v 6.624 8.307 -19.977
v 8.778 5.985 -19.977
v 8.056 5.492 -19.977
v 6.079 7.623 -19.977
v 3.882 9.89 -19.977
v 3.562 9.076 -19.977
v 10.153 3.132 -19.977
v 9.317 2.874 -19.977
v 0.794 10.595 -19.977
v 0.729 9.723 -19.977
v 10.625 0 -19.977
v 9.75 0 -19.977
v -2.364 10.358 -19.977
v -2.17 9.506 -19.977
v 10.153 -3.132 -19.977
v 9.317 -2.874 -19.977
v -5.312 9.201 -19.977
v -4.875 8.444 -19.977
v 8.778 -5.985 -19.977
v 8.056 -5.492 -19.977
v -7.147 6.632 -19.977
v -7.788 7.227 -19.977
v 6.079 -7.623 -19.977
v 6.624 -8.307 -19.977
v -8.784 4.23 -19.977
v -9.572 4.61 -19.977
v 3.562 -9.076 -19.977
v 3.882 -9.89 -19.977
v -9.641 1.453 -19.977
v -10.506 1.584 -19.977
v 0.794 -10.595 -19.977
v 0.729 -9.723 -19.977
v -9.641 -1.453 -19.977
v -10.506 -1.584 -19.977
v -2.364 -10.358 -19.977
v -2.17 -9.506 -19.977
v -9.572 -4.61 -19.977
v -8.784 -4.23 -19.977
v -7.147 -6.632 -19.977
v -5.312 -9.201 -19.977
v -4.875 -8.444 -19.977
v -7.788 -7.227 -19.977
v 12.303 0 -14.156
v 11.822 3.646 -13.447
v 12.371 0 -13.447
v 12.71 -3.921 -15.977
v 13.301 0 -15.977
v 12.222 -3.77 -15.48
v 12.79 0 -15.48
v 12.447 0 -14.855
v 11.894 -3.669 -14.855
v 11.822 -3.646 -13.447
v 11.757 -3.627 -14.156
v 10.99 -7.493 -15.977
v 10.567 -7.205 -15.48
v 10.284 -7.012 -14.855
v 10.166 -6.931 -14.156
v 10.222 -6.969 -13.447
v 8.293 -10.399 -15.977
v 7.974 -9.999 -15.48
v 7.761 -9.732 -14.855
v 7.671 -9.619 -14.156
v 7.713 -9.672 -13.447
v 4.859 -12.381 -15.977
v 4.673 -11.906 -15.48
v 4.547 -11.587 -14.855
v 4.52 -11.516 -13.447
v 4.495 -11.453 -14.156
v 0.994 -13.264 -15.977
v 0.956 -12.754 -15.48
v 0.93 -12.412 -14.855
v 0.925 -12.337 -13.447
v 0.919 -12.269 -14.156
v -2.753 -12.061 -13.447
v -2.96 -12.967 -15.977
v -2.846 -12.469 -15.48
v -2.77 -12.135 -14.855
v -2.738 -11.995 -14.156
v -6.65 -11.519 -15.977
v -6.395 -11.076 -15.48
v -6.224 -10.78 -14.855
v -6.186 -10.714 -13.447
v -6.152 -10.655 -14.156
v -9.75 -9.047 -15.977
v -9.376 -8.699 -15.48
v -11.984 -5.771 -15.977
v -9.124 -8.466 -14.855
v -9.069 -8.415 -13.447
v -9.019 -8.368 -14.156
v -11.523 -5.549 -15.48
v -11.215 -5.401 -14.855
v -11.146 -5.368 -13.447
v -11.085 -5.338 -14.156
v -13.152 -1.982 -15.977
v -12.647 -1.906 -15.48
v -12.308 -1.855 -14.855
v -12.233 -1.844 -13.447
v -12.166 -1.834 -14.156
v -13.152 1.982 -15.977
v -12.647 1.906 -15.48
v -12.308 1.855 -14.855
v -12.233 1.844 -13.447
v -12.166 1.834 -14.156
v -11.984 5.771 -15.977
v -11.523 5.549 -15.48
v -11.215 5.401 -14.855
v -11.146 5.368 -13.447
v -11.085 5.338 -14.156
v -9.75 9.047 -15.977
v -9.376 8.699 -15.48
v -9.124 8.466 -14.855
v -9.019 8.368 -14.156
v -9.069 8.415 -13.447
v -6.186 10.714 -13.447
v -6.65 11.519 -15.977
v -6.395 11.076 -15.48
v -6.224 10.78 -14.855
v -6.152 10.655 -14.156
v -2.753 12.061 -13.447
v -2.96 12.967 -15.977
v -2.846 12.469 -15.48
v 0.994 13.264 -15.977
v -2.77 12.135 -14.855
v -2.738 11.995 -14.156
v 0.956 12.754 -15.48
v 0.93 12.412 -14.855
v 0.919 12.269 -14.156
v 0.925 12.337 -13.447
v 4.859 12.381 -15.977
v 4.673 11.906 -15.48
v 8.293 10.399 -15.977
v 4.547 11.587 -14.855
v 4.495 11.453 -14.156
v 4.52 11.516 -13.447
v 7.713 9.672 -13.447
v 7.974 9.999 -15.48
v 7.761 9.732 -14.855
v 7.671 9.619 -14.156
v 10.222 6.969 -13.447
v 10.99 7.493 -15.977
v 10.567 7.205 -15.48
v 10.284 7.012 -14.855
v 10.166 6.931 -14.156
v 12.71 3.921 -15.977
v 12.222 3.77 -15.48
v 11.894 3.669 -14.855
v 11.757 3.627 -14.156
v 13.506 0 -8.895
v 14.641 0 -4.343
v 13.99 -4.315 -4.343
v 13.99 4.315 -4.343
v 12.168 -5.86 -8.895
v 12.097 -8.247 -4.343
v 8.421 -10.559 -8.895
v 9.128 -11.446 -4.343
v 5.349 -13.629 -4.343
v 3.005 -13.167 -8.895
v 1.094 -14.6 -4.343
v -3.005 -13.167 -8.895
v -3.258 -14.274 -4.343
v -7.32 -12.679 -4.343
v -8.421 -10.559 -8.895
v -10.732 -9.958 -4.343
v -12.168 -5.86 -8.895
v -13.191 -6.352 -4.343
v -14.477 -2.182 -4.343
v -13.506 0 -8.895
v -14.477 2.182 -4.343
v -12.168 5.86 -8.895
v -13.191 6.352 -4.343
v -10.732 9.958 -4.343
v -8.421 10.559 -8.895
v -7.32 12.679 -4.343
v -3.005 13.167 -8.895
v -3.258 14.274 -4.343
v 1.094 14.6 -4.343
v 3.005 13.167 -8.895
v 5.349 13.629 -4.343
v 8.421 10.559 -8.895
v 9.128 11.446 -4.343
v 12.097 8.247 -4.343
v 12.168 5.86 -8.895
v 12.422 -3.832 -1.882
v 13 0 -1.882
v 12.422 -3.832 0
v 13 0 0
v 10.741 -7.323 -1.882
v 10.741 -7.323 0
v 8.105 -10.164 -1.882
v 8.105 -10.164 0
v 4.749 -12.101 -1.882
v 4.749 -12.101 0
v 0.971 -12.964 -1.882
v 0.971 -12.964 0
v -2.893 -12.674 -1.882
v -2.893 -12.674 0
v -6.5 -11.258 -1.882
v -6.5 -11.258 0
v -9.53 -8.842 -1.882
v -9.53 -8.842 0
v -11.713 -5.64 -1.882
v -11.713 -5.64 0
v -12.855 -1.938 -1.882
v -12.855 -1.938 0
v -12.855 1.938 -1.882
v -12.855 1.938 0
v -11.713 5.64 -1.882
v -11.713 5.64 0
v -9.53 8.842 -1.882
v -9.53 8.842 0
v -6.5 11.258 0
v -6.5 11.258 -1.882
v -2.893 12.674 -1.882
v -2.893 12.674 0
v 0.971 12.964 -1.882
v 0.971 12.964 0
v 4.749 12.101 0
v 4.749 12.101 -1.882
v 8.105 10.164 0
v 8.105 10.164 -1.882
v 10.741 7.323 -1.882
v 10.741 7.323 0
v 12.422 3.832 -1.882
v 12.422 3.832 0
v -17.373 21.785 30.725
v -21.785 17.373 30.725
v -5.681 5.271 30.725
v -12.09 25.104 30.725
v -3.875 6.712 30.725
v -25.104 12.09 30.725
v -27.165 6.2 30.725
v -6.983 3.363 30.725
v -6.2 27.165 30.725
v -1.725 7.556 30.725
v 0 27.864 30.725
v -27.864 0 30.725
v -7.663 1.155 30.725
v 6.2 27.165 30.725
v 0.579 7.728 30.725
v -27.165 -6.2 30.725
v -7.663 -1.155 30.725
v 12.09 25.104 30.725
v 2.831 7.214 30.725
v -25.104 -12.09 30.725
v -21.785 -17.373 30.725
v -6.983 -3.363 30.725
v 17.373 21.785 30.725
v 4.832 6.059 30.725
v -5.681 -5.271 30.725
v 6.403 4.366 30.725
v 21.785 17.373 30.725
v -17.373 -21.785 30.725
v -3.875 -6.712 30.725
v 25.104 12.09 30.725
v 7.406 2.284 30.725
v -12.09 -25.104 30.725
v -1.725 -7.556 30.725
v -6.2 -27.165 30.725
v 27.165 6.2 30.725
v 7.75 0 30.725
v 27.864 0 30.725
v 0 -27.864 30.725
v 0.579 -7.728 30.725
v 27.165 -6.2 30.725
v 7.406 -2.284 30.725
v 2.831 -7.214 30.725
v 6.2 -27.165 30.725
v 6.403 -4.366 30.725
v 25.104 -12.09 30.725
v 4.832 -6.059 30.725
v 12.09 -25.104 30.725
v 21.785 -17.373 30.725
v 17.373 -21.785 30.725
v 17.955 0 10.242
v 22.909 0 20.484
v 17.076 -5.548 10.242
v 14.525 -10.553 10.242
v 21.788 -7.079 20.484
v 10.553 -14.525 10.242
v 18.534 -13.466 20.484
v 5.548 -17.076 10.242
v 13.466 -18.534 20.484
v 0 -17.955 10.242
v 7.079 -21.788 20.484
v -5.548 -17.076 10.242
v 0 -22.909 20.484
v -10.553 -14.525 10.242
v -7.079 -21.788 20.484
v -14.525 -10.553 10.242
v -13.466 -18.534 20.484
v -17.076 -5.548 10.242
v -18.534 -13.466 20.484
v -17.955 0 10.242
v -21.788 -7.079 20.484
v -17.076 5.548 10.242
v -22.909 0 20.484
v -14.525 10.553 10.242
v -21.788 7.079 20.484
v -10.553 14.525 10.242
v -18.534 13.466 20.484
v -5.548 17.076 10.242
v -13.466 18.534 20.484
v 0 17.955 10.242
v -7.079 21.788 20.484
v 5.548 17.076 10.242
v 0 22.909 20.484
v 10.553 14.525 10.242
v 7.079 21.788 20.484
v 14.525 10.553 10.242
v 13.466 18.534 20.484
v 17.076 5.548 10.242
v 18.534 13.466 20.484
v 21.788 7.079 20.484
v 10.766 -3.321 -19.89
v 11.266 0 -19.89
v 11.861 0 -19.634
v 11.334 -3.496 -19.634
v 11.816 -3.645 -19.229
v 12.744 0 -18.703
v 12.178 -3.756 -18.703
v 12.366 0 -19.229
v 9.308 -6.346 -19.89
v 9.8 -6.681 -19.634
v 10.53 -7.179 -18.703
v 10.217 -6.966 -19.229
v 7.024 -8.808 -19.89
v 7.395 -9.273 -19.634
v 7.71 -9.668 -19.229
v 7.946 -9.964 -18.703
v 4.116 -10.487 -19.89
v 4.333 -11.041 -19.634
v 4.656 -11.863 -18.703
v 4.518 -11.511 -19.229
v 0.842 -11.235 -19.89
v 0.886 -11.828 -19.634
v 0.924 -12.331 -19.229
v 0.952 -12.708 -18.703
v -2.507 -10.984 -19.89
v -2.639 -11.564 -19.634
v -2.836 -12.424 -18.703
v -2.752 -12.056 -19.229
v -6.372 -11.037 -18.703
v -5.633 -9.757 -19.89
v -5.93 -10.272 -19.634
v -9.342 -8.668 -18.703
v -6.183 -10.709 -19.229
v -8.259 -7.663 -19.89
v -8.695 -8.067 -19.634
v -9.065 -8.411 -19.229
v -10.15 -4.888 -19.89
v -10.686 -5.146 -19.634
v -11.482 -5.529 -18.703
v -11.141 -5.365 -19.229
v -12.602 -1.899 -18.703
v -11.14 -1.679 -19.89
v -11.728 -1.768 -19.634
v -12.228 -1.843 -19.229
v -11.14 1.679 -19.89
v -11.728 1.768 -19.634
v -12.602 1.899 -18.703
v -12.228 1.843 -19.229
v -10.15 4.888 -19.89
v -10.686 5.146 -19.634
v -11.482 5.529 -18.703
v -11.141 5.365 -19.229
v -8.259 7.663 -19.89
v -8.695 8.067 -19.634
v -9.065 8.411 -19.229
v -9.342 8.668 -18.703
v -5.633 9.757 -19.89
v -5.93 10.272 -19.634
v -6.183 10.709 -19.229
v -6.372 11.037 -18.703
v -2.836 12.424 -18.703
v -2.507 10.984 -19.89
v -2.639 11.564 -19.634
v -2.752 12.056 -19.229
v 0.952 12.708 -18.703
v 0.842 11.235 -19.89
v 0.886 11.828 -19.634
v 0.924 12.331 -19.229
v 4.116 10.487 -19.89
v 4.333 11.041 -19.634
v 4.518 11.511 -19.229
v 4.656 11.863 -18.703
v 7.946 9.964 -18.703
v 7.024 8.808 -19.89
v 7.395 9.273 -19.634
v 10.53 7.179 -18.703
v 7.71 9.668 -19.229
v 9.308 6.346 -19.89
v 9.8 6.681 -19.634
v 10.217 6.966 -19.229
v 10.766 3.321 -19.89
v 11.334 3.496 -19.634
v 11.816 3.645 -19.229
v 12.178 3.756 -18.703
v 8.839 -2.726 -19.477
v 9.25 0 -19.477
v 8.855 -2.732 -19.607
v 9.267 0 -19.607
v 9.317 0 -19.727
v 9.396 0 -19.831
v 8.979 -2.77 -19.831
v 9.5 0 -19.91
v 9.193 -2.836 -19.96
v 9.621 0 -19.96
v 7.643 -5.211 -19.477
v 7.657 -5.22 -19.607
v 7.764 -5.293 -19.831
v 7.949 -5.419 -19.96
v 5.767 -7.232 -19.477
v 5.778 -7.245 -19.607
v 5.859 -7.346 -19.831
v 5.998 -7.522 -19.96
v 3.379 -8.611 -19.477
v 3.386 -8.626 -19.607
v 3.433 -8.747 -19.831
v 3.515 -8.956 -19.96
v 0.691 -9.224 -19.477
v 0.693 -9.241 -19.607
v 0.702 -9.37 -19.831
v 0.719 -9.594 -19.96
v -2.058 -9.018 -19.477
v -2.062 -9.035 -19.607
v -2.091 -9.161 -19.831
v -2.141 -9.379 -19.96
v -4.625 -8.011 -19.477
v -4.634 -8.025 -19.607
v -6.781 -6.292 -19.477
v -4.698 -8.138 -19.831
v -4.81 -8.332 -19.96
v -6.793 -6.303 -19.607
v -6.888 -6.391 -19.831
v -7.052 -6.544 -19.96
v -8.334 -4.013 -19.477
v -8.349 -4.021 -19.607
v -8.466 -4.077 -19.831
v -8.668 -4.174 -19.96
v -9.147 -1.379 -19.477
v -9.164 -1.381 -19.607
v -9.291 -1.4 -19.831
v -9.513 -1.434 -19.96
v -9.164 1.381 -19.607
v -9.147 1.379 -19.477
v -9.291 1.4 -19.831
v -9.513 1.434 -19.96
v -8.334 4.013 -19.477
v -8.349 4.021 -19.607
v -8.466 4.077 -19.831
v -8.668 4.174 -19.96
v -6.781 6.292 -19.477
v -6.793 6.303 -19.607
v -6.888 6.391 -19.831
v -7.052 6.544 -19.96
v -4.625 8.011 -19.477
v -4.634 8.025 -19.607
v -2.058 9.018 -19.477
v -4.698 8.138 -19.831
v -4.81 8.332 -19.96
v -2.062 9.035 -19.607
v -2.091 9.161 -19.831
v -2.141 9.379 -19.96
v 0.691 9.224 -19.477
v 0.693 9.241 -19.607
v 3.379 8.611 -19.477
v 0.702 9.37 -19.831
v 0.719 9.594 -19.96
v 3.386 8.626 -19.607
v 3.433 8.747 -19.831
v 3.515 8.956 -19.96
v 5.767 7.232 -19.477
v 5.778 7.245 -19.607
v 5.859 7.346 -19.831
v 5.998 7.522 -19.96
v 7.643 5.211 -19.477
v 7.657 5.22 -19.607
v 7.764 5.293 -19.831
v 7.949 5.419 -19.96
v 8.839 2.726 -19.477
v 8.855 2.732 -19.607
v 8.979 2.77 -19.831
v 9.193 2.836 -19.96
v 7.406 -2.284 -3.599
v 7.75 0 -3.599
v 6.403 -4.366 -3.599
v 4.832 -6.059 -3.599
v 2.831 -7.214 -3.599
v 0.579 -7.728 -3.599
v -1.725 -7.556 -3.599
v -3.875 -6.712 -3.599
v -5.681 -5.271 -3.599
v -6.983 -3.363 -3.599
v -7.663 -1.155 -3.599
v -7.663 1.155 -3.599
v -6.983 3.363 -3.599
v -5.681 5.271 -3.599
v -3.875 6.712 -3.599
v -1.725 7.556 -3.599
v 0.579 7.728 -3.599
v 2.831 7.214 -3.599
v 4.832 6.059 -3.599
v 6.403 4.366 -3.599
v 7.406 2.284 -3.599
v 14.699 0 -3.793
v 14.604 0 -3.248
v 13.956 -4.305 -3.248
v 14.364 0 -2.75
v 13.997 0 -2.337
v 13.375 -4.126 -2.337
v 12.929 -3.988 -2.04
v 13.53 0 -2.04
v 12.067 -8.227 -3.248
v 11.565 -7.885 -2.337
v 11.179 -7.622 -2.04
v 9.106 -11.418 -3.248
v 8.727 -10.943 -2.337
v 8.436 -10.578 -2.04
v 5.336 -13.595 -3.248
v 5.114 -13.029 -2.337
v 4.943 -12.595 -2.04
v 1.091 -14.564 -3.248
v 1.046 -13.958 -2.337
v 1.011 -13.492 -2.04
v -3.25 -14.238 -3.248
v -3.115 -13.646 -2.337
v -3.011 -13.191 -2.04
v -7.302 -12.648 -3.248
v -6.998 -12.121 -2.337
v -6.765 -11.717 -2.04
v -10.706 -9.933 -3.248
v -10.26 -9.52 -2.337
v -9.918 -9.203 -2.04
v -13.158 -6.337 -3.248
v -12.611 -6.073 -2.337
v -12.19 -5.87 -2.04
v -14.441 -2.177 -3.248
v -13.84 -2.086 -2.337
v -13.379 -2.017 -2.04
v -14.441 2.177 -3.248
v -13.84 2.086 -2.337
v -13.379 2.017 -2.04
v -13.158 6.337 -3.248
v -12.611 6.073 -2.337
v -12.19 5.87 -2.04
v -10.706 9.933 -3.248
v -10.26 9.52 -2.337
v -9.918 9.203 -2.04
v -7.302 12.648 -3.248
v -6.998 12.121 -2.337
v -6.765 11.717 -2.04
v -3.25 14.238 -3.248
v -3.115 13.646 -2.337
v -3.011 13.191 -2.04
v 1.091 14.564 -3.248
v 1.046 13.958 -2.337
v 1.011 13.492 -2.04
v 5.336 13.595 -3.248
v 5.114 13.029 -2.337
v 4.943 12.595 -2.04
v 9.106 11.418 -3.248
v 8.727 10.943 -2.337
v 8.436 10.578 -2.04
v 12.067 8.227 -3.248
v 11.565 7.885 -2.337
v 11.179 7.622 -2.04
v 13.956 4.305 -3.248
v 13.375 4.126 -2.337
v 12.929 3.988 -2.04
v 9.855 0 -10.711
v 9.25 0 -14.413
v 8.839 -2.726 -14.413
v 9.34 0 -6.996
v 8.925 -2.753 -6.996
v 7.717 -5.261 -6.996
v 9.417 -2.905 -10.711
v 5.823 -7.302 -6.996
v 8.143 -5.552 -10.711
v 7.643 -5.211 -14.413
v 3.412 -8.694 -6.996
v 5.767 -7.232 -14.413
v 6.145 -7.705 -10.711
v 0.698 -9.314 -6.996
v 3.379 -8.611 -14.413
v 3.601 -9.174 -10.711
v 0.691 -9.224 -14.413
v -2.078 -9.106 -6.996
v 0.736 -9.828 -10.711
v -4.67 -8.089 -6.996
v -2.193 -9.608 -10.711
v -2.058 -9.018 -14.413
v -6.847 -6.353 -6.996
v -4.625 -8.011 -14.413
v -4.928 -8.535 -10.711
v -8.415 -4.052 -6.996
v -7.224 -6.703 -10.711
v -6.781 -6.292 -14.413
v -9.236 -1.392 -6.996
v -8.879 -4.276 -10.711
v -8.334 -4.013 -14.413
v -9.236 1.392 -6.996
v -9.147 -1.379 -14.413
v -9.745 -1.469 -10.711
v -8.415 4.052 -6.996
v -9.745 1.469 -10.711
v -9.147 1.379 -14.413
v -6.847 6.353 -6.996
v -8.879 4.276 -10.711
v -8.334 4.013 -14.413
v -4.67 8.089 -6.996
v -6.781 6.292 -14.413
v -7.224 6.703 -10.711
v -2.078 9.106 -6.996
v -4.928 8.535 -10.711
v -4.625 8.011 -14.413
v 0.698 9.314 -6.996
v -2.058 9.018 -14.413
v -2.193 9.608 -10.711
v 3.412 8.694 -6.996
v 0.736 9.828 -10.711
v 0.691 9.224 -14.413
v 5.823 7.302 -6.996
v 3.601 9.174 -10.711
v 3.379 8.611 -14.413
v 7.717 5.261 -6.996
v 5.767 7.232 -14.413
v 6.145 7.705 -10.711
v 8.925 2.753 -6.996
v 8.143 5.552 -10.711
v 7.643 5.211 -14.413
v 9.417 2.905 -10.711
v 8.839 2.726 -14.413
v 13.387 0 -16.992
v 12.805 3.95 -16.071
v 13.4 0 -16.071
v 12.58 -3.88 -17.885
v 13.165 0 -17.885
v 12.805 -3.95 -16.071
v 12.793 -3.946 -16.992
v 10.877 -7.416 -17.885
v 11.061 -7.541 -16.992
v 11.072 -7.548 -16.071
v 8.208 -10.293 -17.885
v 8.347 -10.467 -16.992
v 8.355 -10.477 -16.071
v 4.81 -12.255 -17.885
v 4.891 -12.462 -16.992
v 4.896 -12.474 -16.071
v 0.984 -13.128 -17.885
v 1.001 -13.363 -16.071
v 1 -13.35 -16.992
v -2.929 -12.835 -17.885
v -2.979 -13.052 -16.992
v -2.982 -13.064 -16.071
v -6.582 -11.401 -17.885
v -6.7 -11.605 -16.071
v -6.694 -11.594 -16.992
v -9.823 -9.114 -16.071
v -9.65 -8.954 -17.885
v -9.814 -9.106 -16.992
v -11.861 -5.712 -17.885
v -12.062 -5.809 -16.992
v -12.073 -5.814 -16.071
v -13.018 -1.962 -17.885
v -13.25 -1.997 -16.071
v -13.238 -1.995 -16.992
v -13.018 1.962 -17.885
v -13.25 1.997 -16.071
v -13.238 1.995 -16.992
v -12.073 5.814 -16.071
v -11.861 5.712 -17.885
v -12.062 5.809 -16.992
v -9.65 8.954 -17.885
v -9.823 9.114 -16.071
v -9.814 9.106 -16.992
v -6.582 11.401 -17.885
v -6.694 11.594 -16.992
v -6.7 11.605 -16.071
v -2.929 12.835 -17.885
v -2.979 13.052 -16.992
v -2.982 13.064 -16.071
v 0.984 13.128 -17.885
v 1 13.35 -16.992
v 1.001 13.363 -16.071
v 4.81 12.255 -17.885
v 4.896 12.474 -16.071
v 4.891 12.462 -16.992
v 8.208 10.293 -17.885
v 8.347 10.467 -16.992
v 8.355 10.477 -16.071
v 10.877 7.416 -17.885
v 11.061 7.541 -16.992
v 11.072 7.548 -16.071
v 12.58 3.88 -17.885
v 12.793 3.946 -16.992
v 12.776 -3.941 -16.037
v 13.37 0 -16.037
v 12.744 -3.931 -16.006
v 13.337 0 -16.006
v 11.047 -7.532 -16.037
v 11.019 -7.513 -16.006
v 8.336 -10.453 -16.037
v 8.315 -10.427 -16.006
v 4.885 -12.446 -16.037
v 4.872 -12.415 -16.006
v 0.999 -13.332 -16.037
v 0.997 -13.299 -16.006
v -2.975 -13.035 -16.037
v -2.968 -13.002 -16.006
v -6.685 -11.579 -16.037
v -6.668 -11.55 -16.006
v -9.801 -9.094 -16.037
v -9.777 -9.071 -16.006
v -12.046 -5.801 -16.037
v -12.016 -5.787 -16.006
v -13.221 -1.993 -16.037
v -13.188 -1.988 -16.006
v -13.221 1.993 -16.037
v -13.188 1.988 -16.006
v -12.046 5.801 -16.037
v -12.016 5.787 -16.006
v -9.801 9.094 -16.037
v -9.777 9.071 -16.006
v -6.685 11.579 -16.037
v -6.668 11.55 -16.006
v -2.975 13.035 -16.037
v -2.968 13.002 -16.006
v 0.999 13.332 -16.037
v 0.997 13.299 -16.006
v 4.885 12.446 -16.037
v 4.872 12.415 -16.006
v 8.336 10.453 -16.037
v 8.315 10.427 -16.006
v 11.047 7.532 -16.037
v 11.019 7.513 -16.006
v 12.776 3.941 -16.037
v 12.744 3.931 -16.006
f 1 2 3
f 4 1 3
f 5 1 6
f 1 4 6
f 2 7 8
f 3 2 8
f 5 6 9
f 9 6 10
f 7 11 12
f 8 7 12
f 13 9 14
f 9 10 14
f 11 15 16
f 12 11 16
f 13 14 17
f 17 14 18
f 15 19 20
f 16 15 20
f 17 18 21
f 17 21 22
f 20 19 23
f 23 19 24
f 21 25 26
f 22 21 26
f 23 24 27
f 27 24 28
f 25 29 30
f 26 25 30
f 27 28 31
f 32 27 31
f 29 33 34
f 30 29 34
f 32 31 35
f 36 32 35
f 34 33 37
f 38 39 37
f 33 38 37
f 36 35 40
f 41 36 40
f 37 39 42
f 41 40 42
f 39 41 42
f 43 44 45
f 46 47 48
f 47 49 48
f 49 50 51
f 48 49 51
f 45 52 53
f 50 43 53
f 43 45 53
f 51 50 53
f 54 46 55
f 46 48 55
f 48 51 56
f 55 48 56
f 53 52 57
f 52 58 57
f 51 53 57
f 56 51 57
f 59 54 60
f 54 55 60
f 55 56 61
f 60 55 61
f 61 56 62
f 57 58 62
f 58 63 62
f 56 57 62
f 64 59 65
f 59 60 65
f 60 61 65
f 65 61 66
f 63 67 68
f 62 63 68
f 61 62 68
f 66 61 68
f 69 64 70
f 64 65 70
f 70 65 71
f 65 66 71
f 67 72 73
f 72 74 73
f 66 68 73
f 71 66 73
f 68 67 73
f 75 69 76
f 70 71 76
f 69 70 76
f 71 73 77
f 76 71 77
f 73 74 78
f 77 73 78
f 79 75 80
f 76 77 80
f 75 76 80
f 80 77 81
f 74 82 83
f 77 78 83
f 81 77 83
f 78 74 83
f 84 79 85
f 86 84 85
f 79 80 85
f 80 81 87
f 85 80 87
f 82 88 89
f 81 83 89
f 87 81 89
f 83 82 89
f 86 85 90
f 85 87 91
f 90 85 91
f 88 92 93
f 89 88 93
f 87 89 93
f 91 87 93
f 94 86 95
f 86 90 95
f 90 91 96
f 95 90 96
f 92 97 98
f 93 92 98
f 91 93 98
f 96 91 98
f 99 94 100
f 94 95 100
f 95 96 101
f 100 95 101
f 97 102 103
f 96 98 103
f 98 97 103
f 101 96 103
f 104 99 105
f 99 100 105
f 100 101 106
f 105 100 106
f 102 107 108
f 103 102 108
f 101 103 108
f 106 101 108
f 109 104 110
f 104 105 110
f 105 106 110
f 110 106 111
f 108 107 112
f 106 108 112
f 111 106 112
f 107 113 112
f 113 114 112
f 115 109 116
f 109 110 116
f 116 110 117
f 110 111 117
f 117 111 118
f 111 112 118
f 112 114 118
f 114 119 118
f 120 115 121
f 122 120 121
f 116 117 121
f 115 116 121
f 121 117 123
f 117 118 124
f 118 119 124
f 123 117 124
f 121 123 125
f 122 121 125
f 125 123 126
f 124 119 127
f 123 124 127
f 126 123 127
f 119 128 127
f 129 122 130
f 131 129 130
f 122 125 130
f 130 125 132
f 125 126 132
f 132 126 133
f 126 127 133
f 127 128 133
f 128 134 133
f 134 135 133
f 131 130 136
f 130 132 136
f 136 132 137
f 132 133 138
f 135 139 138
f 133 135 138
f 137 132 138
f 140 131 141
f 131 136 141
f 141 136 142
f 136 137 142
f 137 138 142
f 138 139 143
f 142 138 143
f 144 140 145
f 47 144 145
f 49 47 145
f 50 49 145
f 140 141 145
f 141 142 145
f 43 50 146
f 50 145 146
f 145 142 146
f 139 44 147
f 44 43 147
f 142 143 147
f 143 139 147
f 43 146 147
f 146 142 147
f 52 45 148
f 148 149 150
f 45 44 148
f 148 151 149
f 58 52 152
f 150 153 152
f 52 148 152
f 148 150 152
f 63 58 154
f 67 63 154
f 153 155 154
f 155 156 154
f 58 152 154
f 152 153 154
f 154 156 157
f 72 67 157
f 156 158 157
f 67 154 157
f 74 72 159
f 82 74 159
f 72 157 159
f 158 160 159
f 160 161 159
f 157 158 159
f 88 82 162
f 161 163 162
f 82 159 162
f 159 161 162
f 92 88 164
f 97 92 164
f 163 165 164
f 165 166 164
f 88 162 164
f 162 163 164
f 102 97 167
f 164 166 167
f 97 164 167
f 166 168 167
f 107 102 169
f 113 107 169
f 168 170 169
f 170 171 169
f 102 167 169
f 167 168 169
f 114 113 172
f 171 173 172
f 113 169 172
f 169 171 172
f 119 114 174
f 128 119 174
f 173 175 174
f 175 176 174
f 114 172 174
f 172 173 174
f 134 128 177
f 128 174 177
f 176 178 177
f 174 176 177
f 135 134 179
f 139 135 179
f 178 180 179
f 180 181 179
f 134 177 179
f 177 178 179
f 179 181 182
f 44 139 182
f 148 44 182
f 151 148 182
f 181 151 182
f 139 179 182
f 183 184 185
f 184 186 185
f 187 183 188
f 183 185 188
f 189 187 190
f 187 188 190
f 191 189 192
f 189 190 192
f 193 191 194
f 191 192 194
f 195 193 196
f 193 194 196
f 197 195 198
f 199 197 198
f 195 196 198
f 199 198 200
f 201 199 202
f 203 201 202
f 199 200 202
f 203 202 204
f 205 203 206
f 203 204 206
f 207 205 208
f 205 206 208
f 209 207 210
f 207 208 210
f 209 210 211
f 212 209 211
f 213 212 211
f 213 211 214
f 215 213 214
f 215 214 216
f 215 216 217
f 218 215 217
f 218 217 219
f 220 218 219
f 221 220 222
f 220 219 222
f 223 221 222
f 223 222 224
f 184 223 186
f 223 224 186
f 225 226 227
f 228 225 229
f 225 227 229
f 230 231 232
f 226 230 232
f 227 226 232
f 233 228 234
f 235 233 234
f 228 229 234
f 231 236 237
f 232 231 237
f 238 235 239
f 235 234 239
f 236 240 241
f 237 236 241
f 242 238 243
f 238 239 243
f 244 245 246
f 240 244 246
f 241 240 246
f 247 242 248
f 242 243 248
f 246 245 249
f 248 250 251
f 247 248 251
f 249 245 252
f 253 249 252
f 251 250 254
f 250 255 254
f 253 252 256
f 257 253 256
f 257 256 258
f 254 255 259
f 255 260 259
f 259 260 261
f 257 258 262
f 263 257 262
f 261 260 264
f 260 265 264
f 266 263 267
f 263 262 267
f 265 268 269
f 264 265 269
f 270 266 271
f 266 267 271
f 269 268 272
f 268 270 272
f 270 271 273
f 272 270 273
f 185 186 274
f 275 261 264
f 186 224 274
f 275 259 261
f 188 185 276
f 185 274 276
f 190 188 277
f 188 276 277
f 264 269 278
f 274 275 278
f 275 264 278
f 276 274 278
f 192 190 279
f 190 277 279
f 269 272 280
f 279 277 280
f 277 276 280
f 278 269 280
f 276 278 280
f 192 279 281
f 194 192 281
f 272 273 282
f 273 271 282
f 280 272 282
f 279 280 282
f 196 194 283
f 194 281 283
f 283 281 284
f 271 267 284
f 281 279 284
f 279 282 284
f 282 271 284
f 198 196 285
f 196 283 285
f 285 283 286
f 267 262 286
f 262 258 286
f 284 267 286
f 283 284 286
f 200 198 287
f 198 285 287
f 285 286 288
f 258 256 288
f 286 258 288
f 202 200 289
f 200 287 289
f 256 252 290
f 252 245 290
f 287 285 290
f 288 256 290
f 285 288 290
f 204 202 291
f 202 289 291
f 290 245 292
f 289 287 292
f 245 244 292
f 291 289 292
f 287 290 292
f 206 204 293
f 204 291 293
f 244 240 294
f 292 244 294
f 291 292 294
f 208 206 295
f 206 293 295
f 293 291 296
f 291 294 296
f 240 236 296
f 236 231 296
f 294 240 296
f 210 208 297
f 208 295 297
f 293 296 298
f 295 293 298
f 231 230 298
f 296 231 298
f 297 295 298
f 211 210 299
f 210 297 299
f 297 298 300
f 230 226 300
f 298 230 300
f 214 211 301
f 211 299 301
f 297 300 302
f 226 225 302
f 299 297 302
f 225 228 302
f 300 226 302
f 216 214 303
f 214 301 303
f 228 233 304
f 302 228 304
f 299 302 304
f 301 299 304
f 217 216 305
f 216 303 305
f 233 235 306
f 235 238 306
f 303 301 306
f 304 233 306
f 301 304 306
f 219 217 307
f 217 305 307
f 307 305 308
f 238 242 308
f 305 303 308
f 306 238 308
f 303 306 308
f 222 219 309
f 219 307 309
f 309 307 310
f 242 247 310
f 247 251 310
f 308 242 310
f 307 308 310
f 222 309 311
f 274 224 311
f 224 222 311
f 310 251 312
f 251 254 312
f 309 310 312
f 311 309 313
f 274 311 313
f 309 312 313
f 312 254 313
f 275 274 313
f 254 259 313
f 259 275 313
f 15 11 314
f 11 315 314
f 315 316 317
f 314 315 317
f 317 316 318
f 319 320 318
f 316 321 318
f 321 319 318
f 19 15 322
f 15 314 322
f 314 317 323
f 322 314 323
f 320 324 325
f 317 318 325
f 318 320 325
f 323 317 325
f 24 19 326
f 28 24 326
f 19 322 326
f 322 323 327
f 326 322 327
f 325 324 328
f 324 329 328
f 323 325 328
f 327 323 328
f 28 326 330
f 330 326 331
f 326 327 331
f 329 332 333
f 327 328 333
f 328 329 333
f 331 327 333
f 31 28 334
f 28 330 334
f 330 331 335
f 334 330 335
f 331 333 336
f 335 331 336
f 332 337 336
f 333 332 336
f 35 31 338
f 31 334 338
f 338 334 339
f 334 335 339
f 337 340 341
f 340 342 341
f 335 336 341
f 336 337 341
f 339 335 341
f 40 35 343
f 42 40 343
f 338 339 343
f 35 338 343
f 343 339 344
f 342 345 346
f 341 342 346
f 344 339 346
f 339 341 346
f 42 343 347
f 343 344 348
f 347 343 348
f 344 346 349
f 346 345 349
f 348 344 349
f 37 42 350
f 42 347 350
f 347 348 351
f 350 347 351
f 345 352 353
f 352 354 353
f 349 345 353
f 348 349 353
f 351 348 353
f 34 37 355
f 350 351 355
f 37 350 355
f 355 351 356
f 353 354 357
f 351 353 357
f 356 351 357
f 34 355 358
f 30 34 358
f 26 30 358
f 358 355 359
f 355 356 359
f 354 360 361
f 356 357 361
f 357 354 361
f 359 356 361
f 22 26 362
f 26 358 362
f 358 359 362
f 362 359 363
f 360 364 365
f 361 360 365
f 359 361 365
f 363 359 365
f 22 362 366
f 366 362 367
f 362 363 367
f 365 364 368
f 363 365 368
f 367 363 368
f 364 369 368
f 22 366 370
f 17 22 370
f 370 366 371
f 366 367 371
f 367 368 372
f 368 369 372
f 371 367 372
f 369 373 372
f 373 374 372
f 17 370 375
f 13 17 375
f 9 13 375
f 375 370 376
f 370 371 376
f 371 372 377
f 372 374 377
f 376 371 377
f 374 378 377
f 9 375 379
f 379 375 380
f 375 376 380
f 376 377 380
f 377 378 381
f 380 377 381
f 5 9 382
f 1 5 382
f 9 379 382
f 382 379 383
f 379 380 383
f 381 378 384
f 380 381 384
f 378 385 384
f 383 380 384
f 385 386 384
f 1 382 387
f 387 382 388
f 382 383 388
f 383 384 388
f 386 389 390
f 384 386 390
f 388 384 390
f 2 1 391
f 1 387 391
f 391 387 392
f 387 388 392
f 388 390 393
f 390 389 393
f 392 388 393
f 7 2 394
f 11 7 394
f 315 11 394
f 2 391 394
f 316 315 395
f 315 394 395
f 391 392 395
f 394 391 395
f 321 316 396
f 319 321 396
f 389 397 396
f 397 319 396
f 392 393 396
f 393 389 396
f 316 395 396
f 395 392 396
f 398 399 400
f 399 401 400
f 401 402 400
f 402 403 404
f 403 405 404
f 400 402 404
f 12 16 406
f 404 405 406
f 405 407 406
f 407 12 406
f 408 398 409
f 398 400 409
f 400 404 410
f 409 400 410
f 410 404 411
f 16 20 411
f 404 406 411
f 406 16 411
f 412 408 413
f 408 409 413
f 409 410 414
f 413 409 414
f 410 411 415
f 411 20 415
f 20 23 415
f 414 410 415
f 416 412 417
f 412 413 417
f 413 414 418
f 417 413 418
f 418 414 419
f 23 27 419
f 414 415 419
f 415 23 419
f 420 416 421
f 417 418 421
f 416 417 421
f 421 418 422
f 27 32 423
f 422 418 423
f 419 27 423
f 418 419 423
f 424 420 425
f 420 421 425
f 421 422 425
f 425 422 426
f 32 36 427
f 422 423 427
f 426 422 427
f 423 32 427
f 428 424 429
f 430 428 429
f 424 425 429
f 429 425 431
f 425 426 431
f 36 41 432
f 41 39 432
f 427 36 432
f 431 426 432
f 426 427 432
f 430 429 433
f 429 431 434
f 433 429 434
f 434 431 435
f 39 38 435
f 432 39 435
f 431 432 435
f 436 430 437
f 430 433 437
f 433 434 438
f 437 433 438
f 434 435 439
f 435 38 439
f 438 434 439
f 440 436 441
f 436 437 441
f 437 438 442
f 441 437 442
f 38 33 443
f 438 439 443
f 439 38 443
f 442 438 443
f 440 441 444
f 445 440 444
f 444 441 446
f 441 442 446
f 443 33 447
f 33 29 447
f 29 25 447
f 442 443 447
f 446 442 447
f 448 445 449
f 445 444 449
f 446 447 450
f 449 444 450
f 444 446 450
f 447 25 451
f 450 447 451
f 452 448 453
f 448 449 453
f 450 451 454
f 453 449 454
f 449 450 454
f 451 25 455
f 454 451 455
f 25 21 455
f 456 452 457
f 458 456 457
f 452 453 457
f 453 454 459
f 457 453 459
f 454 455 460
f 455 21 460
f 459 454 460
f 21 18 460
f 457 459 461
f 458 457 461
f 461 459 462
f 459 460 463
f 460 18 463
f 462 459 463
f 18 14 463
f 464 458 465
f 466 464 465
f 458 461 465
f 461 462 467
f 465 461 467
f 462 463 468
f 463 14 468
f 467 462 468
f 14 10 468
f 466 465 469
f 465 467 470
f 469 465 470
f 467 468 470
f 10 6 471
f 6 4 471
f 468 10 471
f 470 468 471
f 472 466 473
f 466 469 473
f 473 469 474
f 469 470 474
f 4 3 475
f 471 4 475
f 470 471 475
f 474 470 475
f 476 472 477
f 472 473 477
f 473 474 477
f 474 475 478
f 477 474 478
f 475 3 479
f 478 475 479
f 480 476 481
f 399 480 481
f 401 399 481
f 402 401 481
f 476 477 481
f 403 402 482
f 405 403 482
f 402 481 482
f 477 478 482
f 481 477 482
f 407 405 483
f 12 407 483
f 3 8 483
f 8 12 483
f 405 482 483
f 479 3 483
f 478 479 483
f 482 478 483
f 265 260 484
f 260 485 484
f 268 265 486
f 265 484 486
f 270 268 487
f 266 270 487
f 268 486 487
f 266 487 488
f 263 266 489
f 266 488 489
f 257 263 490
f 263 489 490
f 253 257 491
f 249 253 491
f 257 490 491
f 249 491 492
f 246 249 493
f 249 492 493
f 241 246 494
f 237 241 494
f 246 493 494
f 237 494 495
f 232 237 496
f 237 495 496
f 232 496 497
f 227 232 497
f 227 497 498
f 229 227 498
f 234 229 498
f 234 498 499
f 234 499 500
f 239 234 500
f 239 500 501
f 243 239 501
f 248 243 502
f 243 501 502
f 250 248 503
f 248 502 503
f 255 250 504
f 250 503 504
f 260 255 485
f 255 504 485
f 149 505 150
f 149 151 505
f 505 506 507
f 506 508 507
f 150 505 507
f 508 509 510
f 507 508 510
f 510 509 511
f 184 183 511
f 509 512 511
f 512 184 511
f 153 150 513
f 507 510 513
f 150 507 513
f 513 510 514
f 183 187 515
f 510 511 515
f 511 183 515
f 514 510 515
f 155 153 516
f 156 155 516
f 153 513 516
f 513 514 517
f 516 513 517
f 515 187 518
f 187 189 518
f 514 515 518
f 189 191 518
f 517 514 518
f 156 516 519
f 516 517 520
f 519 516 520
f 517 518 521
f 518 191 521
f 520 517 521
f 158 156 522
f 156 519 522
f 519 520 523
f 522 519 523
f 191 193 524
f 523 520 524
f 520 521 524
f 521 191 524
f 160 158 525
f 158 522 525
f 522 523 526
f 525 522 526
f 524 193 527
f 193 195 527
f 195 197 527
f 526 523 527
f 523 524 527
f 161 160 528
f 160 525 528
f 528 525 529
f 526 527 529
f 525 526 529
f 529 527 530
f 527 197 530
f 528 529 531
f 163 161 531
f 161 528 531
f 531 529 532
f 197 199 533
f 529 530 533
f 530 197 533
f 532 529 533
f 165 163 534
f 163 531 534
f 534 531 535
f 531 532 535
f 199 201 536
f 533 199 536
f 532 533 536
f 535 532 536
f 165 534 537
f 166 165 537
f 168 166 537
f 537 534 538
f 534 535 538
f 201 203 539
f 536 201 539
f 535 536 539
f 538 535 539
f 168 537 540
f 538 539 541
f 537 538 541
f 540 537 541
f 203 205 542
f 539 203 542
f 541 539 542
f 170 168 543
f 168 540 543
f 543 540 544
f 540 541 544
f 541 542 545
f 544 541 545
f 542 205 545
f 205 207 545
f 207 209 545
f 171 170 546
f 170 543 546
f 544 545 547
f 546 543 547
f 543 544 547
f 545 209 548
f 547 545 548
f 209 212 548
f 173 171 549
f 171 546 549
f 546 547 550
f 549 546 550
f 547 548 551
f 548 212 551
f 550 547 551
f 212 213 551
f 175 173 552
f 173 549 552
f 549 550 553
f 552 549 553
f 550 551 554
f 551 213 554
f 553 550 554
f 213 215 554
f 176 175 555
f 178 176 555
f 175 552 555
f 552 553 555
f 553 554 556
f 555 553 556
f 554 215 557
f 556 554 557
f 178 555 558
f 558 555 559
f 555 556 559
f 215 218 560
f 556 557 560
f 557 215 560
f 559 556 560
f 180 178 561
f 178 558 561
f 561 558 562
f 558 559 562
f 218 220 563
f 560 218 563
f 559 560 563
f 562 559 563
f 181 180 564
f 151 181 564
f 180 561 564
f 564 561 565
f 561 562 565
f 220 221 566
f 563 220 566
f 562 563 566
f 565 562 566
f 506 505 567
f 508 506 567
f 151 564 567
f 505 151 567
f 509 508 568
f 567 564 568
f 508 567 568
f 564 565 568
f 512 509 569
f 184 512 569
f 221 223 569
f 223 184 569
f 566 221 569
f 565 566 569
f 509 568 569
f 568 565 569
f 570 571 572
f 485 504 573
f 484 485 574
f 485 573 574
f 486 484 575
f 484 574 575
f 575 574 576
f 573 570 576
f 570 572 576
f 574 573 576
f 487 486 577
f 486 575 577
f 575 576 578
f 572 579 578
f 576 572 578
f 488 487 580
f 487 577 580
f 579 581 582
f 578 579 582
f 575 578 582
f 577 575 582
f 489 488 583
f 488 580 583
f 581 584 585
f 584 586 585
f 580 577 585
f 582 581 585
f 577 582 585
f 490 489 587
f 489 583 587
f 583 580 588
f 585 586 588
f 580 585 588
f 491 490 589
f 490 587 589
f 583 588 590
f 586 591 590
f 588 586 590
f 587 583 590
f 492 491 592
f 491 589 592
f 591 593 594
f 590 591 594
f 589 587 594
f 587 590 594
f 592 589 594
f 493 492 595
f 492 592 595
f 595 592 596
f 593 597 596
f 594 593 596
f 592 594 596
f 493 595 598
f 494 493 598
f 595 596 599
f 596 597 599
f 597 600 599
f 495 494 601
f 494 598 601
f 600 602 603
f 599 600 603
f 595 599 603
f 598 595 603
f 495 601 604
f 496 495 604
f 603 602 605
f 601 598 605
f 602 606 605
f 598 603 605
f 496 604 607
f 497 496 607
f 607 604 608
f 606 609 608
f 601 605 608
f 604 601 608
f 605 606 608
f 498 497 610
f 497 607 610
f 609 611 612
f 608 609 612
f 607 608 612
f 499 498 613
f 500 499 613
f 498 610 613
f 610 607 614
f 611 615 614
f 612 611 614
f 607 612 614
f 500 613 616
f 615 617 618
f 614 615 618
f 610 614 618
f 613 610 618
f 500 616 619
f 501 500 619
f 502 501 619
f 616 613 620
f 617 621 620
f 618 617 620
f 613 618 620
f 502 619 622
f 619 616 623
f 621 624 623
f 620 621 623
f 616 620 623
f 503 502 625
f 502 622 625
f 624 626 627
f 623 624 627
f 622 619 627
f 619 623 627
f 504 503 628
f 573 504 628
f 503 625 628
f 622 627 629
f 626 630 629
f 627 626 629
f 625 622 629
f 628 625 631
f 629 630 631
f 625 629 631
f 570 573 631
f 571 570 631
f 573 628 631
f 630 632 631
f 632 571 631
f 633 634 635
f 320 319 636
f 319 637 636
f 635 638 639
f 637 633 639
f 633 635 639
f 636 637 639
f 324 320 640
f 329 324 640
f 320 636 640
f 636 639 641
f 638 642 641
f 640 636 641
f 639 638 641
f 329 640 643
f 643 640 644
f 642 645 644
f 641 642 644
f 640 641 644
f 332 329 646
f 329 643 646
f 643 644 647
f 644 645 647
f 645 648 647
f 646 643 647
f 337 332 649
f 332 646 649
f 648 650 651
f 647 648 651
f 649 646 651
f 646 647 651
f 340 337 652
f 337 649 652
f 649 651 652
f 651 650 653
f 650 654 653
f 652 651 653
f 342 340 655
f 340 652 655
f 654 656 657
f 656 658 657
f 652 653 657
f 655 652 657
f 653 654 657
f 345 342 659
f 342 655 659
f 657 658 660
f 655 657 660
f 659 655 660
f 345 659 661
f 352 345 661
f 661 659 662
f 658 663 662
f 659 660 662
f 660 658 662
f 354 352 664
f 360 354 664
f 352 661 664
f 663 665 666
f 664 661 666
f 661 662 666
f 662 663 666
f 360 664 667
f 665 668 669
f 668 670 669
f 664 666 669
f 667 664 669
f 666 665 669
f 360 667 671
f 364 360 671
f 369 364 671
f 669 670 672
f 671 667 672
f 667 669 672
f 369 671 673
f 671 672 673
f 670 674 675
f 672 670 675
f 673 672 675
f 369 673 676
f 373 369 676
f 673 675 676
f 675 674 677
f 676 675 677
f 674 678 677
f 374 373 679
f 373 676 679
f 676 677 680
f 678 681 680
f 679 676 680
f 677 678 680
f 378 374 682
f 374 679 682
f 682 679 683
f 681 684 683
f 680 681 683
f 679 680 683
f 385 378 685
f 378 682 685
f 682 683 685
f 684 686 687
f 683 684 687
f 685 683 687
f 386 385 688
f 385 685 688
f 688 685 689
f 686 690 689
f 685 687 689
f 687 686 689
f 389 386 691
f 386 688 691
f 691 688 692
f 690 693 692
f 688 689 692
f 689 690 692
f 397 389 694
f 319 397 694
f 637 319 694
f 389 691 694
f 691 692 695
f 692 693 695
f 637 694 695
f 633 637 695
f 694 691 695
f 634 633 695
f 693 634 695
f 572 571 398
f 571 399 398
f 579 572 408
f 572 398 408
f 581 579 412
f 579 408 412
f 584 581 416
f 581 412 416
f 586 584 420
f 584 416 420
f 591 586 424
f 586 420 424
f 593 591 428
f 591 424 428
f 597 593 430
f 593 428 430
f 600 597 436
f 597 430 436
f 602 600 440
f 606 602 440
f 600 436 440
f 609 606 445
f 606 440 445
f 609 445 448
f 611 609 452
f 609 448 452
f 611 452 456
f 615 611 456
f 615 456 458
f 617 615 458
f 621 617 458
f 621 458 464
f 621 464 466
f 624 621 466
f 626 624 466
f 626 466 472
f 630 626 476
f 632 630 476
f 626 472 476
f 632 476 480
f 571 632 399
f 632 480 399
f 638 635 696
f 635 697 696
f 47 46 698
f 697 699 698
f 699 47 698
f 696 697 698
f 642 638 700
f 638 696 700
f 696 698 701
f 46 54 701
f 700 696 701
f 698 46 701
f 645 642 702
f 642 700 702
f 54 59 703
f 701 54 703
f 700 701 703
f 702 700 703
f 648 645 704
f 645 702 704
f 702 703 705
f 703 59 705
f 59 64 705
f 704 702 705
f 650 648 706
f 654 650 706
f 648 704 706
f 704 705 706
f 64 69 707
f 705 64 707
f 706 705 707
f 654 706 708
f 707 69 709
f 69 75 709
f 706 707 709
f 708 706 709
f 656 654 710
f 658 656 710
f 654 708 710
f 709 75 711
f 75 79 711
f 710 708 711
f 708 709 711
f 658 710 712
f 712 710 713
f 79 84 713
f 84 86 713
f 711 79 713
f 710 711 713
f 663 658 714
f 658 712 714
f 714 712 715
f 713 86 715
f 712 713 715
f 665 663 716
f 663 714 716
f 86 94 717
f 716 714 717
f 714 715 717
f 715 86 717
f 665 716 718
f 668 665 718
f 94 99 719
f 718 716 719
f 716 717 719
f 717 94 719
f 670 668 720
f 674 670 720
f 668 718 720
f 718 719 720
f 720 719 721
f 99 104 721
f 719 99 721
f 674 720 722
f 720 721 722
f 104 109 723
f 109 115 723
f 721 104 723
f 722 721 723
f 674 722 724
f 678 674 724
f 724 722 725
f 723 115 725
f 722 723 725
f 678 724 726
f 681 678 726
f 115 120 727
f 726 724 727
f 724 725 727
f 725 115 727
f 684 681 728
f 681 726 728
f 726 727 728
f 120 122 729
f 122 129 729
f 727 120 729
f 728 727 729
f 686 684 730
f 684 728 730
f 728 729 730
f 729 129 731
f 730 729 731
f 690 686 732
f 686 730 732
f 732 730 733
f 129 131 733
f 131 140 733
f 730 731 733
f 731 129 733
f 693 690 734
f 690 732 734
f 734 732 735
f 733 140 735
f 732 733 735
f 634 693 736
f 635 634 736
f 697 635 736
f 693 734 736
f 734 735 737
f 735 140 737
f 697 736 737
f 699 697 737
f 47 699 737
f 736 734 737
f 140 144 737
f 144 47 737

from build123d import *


with BuildPart() as part:
    # Sketch1 → Revolve1 (revolve)
    with BuildSketch(Plane(origin=(0, 0, 0), x_dir=(1, 0, 0), z_dir=(0, 1, 0)), mode=Mode.PRIVATE) as revolve1_sk:
        with BuildLine():
            Line((-7.75, 0), (-7.75, 3.59874773))
            ThreePointArc((-7.75, 3.59874773), (-9.737150145, 8.834353772), (-9.25, 14.413154814))
            Line((-9.25, 14.413154814), (-9.25, 19.477254176))
            ThreePointArc((-9.25, 19.477254176), (-9.396446609, 19.830807566), (-9.75, 19.977254176))
            Line((-9.75, 19.977254176), (-10.624554433, 19.977254176))
            ThreePointArc((-10.624554433, 19.977254176), (-11.860926928, 19.63428676), (-12.743936524, 18.703406721))
            ThreePointArc((-12.743936524, 18.703406721), (-13.301894318, 17.444688456), (-13.4, 16.071348059))
            ThreePointArc((-13.4, 16.071348059), (-13.353676429, 16.020899185), (-13.300893142, 15.977254176))
            ThreePointArc((-13.300893142, 15.977254176), (-12.447206352, 14.854853584), (-12.371266932, 13.446735184))
            Line((-12.371266932, 13.446735184), (-14.64061089, 4.343335661))
            ThreePointArc((-14.64061089, 4.343335661), (-14.364146668, 2.750238564), (-13, 1.882197841))
            Line((-13, 1.882197841), (-13, 0))
            Line((-13, 0), (-27.863515915, -30.725250222))
            Line((-27.863515915, -30.725250222), (-7.75, -30.725250222))
            Line((-7.75, -30.725250222), (-7.75, 0))
        make_face()
    revolve(revolve1_sk.sketch.rotate(Axis((0, 0, 0), (0, 0, -1)), 180), axis=Axis((0, 0, 0), (0, 0, -1)))


solid = part.part
